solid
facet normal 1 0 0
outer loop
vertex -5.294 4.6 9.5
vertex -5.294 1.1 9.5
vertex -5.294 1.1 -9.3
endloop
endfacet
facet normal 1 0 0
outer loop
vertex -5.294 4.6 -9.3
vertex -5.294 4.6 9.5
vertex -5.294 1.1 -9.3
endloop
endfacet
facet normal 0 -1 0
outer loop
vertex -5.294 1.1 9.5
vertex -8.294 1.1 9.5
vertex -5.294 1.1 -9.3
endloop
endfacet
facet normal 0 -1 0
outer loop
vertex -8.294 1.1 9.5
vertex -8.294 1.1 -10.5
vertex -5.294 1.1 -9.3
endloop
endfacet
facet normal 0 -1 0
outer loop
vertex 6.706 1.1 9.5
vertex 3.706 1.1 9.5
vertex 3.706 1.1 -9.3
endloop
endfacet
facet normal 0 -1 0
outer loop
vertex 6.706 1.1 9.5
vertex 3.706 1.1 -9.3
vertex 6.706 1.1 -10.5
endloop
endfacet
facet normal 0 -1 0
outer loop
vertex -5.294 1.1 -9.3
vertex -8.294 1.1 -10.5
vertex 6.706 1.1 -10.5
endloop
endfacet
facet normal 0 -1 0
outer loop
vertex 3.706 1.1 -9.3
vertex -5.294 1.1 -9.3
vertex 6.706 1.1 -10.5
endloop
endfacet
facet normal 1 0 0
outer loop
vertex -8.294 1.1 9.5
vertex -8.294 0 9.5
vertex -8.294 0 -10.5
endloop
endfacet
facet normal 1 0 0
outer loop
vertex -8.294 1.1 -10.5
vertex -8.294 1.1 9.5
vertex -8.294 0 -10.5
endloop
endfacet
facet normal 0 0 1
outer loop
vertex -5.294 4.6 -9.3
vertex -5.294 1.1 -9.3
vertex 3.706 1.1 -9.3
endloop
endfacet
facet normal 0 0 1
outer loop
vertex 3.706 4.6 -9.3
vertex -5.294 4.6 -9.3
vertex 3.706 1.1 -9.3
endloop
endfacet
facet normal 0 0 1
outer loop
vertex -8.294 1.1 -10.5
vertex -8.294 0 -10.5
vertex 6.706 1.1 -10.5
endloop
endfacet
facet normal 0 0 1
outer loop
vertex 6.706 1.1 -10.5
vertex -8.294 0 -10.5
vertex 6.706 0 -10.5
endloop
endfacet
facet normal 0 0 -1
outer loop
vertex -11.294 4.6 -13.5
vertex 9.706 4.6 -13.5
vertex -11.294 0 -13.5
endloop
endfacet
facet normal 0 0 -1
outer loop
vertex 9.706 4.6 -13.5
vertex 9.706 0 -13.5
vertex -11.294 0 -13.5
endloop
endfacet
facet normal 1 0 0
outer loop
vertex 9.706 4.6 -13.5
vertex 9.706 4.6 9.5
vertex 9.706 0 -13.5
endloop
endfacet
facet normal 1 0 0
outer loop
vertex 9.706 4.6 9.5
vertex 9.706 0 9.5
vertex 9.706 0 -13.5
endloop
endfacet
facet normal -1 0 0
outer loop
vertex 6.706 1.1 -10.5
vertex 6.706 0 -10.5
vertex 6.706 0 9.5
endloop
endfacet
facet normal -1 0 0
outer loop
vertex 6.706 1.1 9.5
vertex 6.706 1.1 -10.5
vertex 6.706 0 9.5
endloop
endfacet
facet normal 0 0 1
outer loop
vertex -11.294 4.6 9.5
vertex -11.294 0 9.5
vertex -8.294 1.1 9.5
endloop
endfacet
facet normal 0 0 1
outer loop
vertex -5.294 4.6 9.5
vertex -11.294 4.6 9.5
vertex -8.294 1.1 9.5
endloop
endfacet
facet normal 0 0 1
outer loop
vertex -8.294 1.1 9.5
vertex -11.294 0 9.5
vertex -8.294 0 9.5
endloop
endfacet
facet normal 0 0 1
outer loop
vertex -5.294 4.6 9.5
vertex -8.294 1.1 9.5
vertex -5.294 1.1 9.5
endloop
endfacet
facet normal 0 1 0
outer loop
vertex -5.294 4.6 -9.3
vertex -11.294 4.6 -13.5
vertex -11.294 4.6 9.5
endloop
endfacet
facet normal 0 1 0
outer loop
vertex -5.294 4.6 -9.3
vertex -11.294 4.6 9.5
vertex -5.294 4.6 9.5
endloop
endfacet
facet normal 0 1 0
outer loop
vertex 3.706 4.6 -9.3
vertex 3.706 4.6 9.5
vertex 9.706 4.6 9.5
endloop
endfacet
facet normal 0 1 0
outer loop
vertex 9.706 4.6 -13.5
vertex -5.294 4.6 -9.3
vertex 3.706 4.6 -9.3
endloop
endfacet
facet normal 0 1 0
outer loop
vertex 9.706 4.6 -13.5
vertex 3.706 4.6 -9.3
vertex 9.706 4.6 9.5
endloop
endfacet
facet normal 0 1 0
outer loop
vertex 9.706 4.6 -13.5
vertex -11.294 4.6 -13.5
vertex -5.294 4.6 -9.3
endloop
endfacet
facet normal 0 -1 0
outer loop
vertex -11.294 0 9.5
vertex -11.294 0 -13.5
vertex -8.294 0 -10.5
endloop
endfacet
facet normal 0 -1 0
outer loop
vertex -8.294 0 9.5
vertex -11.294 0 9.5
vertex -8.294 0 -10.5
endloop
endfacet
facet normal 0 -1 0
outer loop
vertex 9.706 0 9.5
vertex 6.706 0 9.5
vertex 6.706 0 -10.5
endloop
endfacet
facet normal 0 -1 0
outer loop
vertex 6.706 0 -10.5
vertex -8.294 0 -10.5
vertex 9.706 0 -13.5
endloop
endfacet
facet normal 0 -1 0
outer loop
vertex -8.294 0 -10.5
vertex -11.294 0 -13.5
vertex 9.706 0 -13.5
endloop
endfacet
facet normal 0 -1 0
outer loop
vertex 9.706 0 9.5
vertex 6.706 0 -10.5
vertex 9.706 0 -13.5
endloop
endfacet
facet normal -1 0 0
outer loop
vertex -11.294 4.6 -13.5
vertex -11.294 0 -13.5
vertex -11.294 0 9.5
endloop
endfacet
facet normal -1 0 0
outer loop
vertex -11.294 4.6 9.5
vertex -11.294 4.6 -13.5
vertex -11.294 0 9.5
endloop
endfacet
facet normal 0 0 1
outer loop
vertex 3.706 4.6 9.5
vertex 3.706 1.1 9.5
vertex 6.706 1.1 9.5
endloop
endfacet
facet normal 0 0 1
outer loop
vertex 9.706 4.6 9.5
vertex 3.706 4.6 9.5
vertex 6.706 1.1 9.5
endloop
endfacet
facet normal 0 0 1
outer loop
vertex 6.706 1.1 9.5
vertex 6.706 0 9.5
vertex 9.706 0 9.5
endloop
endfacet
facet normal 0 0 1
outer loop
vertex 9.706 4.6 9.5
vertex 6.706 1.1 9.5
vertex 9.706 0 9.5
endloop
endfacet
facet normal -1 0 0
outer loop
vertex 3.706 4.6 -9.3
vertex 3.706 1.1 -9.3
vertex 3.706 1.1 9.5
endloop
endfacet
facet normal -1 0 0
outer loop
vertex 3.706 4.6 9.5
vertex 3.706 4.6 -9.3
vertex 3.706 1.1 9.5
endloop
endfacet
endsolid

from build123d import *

# Parameters (mm, degrees)
BOSS_EXTRUDE1_DEPTH = 1.1
BOSS_EXTRUDE2_DEPTH = 3.5


with BuildPart() as part:
    # Sketch1 → Boss-Extrude1 (new body)
    with BuildSketch(Plane(origin=(0, 0, 0), x_dir=(1, 0, 0), z_dir=(0, 1, 0))):
        Polygon((9.705882353, 13.5), (-11.294117647, 13.5), (-11.294117647, -9.5), (-8.294117647, -9.5), (-8.294117647, 10.5), (6.705882353, 10.5), (6.705882353, -9.5), (9.705882353, -9.5), align=None)
    extrude(amount=BOSS_EXTRUDE1_DEPTH)

    # Sketch2 → Boss-Extrude2 (add)
    with BuildSketch(Plane(origin=(0, 1.1, 0), x_dir=(1, 0, 0), z_dir=(0, 1, 0))):
        Polygon((-8.294117647, -9.5), (-5.294117647, -9.5), (-5.294117647, 9.3), (3.705882353, 9.3), (3.705882353, -9.5), (6.705882353, -9.5), (9.705882353, -9.5), (9.705882353, 13.5), (-11.294117647, 13.5), (-11.294117647, -9.5), align=None)
    extrude(amount=BOSS_EXTRUDE2_DEPTH)


solid = part.part
